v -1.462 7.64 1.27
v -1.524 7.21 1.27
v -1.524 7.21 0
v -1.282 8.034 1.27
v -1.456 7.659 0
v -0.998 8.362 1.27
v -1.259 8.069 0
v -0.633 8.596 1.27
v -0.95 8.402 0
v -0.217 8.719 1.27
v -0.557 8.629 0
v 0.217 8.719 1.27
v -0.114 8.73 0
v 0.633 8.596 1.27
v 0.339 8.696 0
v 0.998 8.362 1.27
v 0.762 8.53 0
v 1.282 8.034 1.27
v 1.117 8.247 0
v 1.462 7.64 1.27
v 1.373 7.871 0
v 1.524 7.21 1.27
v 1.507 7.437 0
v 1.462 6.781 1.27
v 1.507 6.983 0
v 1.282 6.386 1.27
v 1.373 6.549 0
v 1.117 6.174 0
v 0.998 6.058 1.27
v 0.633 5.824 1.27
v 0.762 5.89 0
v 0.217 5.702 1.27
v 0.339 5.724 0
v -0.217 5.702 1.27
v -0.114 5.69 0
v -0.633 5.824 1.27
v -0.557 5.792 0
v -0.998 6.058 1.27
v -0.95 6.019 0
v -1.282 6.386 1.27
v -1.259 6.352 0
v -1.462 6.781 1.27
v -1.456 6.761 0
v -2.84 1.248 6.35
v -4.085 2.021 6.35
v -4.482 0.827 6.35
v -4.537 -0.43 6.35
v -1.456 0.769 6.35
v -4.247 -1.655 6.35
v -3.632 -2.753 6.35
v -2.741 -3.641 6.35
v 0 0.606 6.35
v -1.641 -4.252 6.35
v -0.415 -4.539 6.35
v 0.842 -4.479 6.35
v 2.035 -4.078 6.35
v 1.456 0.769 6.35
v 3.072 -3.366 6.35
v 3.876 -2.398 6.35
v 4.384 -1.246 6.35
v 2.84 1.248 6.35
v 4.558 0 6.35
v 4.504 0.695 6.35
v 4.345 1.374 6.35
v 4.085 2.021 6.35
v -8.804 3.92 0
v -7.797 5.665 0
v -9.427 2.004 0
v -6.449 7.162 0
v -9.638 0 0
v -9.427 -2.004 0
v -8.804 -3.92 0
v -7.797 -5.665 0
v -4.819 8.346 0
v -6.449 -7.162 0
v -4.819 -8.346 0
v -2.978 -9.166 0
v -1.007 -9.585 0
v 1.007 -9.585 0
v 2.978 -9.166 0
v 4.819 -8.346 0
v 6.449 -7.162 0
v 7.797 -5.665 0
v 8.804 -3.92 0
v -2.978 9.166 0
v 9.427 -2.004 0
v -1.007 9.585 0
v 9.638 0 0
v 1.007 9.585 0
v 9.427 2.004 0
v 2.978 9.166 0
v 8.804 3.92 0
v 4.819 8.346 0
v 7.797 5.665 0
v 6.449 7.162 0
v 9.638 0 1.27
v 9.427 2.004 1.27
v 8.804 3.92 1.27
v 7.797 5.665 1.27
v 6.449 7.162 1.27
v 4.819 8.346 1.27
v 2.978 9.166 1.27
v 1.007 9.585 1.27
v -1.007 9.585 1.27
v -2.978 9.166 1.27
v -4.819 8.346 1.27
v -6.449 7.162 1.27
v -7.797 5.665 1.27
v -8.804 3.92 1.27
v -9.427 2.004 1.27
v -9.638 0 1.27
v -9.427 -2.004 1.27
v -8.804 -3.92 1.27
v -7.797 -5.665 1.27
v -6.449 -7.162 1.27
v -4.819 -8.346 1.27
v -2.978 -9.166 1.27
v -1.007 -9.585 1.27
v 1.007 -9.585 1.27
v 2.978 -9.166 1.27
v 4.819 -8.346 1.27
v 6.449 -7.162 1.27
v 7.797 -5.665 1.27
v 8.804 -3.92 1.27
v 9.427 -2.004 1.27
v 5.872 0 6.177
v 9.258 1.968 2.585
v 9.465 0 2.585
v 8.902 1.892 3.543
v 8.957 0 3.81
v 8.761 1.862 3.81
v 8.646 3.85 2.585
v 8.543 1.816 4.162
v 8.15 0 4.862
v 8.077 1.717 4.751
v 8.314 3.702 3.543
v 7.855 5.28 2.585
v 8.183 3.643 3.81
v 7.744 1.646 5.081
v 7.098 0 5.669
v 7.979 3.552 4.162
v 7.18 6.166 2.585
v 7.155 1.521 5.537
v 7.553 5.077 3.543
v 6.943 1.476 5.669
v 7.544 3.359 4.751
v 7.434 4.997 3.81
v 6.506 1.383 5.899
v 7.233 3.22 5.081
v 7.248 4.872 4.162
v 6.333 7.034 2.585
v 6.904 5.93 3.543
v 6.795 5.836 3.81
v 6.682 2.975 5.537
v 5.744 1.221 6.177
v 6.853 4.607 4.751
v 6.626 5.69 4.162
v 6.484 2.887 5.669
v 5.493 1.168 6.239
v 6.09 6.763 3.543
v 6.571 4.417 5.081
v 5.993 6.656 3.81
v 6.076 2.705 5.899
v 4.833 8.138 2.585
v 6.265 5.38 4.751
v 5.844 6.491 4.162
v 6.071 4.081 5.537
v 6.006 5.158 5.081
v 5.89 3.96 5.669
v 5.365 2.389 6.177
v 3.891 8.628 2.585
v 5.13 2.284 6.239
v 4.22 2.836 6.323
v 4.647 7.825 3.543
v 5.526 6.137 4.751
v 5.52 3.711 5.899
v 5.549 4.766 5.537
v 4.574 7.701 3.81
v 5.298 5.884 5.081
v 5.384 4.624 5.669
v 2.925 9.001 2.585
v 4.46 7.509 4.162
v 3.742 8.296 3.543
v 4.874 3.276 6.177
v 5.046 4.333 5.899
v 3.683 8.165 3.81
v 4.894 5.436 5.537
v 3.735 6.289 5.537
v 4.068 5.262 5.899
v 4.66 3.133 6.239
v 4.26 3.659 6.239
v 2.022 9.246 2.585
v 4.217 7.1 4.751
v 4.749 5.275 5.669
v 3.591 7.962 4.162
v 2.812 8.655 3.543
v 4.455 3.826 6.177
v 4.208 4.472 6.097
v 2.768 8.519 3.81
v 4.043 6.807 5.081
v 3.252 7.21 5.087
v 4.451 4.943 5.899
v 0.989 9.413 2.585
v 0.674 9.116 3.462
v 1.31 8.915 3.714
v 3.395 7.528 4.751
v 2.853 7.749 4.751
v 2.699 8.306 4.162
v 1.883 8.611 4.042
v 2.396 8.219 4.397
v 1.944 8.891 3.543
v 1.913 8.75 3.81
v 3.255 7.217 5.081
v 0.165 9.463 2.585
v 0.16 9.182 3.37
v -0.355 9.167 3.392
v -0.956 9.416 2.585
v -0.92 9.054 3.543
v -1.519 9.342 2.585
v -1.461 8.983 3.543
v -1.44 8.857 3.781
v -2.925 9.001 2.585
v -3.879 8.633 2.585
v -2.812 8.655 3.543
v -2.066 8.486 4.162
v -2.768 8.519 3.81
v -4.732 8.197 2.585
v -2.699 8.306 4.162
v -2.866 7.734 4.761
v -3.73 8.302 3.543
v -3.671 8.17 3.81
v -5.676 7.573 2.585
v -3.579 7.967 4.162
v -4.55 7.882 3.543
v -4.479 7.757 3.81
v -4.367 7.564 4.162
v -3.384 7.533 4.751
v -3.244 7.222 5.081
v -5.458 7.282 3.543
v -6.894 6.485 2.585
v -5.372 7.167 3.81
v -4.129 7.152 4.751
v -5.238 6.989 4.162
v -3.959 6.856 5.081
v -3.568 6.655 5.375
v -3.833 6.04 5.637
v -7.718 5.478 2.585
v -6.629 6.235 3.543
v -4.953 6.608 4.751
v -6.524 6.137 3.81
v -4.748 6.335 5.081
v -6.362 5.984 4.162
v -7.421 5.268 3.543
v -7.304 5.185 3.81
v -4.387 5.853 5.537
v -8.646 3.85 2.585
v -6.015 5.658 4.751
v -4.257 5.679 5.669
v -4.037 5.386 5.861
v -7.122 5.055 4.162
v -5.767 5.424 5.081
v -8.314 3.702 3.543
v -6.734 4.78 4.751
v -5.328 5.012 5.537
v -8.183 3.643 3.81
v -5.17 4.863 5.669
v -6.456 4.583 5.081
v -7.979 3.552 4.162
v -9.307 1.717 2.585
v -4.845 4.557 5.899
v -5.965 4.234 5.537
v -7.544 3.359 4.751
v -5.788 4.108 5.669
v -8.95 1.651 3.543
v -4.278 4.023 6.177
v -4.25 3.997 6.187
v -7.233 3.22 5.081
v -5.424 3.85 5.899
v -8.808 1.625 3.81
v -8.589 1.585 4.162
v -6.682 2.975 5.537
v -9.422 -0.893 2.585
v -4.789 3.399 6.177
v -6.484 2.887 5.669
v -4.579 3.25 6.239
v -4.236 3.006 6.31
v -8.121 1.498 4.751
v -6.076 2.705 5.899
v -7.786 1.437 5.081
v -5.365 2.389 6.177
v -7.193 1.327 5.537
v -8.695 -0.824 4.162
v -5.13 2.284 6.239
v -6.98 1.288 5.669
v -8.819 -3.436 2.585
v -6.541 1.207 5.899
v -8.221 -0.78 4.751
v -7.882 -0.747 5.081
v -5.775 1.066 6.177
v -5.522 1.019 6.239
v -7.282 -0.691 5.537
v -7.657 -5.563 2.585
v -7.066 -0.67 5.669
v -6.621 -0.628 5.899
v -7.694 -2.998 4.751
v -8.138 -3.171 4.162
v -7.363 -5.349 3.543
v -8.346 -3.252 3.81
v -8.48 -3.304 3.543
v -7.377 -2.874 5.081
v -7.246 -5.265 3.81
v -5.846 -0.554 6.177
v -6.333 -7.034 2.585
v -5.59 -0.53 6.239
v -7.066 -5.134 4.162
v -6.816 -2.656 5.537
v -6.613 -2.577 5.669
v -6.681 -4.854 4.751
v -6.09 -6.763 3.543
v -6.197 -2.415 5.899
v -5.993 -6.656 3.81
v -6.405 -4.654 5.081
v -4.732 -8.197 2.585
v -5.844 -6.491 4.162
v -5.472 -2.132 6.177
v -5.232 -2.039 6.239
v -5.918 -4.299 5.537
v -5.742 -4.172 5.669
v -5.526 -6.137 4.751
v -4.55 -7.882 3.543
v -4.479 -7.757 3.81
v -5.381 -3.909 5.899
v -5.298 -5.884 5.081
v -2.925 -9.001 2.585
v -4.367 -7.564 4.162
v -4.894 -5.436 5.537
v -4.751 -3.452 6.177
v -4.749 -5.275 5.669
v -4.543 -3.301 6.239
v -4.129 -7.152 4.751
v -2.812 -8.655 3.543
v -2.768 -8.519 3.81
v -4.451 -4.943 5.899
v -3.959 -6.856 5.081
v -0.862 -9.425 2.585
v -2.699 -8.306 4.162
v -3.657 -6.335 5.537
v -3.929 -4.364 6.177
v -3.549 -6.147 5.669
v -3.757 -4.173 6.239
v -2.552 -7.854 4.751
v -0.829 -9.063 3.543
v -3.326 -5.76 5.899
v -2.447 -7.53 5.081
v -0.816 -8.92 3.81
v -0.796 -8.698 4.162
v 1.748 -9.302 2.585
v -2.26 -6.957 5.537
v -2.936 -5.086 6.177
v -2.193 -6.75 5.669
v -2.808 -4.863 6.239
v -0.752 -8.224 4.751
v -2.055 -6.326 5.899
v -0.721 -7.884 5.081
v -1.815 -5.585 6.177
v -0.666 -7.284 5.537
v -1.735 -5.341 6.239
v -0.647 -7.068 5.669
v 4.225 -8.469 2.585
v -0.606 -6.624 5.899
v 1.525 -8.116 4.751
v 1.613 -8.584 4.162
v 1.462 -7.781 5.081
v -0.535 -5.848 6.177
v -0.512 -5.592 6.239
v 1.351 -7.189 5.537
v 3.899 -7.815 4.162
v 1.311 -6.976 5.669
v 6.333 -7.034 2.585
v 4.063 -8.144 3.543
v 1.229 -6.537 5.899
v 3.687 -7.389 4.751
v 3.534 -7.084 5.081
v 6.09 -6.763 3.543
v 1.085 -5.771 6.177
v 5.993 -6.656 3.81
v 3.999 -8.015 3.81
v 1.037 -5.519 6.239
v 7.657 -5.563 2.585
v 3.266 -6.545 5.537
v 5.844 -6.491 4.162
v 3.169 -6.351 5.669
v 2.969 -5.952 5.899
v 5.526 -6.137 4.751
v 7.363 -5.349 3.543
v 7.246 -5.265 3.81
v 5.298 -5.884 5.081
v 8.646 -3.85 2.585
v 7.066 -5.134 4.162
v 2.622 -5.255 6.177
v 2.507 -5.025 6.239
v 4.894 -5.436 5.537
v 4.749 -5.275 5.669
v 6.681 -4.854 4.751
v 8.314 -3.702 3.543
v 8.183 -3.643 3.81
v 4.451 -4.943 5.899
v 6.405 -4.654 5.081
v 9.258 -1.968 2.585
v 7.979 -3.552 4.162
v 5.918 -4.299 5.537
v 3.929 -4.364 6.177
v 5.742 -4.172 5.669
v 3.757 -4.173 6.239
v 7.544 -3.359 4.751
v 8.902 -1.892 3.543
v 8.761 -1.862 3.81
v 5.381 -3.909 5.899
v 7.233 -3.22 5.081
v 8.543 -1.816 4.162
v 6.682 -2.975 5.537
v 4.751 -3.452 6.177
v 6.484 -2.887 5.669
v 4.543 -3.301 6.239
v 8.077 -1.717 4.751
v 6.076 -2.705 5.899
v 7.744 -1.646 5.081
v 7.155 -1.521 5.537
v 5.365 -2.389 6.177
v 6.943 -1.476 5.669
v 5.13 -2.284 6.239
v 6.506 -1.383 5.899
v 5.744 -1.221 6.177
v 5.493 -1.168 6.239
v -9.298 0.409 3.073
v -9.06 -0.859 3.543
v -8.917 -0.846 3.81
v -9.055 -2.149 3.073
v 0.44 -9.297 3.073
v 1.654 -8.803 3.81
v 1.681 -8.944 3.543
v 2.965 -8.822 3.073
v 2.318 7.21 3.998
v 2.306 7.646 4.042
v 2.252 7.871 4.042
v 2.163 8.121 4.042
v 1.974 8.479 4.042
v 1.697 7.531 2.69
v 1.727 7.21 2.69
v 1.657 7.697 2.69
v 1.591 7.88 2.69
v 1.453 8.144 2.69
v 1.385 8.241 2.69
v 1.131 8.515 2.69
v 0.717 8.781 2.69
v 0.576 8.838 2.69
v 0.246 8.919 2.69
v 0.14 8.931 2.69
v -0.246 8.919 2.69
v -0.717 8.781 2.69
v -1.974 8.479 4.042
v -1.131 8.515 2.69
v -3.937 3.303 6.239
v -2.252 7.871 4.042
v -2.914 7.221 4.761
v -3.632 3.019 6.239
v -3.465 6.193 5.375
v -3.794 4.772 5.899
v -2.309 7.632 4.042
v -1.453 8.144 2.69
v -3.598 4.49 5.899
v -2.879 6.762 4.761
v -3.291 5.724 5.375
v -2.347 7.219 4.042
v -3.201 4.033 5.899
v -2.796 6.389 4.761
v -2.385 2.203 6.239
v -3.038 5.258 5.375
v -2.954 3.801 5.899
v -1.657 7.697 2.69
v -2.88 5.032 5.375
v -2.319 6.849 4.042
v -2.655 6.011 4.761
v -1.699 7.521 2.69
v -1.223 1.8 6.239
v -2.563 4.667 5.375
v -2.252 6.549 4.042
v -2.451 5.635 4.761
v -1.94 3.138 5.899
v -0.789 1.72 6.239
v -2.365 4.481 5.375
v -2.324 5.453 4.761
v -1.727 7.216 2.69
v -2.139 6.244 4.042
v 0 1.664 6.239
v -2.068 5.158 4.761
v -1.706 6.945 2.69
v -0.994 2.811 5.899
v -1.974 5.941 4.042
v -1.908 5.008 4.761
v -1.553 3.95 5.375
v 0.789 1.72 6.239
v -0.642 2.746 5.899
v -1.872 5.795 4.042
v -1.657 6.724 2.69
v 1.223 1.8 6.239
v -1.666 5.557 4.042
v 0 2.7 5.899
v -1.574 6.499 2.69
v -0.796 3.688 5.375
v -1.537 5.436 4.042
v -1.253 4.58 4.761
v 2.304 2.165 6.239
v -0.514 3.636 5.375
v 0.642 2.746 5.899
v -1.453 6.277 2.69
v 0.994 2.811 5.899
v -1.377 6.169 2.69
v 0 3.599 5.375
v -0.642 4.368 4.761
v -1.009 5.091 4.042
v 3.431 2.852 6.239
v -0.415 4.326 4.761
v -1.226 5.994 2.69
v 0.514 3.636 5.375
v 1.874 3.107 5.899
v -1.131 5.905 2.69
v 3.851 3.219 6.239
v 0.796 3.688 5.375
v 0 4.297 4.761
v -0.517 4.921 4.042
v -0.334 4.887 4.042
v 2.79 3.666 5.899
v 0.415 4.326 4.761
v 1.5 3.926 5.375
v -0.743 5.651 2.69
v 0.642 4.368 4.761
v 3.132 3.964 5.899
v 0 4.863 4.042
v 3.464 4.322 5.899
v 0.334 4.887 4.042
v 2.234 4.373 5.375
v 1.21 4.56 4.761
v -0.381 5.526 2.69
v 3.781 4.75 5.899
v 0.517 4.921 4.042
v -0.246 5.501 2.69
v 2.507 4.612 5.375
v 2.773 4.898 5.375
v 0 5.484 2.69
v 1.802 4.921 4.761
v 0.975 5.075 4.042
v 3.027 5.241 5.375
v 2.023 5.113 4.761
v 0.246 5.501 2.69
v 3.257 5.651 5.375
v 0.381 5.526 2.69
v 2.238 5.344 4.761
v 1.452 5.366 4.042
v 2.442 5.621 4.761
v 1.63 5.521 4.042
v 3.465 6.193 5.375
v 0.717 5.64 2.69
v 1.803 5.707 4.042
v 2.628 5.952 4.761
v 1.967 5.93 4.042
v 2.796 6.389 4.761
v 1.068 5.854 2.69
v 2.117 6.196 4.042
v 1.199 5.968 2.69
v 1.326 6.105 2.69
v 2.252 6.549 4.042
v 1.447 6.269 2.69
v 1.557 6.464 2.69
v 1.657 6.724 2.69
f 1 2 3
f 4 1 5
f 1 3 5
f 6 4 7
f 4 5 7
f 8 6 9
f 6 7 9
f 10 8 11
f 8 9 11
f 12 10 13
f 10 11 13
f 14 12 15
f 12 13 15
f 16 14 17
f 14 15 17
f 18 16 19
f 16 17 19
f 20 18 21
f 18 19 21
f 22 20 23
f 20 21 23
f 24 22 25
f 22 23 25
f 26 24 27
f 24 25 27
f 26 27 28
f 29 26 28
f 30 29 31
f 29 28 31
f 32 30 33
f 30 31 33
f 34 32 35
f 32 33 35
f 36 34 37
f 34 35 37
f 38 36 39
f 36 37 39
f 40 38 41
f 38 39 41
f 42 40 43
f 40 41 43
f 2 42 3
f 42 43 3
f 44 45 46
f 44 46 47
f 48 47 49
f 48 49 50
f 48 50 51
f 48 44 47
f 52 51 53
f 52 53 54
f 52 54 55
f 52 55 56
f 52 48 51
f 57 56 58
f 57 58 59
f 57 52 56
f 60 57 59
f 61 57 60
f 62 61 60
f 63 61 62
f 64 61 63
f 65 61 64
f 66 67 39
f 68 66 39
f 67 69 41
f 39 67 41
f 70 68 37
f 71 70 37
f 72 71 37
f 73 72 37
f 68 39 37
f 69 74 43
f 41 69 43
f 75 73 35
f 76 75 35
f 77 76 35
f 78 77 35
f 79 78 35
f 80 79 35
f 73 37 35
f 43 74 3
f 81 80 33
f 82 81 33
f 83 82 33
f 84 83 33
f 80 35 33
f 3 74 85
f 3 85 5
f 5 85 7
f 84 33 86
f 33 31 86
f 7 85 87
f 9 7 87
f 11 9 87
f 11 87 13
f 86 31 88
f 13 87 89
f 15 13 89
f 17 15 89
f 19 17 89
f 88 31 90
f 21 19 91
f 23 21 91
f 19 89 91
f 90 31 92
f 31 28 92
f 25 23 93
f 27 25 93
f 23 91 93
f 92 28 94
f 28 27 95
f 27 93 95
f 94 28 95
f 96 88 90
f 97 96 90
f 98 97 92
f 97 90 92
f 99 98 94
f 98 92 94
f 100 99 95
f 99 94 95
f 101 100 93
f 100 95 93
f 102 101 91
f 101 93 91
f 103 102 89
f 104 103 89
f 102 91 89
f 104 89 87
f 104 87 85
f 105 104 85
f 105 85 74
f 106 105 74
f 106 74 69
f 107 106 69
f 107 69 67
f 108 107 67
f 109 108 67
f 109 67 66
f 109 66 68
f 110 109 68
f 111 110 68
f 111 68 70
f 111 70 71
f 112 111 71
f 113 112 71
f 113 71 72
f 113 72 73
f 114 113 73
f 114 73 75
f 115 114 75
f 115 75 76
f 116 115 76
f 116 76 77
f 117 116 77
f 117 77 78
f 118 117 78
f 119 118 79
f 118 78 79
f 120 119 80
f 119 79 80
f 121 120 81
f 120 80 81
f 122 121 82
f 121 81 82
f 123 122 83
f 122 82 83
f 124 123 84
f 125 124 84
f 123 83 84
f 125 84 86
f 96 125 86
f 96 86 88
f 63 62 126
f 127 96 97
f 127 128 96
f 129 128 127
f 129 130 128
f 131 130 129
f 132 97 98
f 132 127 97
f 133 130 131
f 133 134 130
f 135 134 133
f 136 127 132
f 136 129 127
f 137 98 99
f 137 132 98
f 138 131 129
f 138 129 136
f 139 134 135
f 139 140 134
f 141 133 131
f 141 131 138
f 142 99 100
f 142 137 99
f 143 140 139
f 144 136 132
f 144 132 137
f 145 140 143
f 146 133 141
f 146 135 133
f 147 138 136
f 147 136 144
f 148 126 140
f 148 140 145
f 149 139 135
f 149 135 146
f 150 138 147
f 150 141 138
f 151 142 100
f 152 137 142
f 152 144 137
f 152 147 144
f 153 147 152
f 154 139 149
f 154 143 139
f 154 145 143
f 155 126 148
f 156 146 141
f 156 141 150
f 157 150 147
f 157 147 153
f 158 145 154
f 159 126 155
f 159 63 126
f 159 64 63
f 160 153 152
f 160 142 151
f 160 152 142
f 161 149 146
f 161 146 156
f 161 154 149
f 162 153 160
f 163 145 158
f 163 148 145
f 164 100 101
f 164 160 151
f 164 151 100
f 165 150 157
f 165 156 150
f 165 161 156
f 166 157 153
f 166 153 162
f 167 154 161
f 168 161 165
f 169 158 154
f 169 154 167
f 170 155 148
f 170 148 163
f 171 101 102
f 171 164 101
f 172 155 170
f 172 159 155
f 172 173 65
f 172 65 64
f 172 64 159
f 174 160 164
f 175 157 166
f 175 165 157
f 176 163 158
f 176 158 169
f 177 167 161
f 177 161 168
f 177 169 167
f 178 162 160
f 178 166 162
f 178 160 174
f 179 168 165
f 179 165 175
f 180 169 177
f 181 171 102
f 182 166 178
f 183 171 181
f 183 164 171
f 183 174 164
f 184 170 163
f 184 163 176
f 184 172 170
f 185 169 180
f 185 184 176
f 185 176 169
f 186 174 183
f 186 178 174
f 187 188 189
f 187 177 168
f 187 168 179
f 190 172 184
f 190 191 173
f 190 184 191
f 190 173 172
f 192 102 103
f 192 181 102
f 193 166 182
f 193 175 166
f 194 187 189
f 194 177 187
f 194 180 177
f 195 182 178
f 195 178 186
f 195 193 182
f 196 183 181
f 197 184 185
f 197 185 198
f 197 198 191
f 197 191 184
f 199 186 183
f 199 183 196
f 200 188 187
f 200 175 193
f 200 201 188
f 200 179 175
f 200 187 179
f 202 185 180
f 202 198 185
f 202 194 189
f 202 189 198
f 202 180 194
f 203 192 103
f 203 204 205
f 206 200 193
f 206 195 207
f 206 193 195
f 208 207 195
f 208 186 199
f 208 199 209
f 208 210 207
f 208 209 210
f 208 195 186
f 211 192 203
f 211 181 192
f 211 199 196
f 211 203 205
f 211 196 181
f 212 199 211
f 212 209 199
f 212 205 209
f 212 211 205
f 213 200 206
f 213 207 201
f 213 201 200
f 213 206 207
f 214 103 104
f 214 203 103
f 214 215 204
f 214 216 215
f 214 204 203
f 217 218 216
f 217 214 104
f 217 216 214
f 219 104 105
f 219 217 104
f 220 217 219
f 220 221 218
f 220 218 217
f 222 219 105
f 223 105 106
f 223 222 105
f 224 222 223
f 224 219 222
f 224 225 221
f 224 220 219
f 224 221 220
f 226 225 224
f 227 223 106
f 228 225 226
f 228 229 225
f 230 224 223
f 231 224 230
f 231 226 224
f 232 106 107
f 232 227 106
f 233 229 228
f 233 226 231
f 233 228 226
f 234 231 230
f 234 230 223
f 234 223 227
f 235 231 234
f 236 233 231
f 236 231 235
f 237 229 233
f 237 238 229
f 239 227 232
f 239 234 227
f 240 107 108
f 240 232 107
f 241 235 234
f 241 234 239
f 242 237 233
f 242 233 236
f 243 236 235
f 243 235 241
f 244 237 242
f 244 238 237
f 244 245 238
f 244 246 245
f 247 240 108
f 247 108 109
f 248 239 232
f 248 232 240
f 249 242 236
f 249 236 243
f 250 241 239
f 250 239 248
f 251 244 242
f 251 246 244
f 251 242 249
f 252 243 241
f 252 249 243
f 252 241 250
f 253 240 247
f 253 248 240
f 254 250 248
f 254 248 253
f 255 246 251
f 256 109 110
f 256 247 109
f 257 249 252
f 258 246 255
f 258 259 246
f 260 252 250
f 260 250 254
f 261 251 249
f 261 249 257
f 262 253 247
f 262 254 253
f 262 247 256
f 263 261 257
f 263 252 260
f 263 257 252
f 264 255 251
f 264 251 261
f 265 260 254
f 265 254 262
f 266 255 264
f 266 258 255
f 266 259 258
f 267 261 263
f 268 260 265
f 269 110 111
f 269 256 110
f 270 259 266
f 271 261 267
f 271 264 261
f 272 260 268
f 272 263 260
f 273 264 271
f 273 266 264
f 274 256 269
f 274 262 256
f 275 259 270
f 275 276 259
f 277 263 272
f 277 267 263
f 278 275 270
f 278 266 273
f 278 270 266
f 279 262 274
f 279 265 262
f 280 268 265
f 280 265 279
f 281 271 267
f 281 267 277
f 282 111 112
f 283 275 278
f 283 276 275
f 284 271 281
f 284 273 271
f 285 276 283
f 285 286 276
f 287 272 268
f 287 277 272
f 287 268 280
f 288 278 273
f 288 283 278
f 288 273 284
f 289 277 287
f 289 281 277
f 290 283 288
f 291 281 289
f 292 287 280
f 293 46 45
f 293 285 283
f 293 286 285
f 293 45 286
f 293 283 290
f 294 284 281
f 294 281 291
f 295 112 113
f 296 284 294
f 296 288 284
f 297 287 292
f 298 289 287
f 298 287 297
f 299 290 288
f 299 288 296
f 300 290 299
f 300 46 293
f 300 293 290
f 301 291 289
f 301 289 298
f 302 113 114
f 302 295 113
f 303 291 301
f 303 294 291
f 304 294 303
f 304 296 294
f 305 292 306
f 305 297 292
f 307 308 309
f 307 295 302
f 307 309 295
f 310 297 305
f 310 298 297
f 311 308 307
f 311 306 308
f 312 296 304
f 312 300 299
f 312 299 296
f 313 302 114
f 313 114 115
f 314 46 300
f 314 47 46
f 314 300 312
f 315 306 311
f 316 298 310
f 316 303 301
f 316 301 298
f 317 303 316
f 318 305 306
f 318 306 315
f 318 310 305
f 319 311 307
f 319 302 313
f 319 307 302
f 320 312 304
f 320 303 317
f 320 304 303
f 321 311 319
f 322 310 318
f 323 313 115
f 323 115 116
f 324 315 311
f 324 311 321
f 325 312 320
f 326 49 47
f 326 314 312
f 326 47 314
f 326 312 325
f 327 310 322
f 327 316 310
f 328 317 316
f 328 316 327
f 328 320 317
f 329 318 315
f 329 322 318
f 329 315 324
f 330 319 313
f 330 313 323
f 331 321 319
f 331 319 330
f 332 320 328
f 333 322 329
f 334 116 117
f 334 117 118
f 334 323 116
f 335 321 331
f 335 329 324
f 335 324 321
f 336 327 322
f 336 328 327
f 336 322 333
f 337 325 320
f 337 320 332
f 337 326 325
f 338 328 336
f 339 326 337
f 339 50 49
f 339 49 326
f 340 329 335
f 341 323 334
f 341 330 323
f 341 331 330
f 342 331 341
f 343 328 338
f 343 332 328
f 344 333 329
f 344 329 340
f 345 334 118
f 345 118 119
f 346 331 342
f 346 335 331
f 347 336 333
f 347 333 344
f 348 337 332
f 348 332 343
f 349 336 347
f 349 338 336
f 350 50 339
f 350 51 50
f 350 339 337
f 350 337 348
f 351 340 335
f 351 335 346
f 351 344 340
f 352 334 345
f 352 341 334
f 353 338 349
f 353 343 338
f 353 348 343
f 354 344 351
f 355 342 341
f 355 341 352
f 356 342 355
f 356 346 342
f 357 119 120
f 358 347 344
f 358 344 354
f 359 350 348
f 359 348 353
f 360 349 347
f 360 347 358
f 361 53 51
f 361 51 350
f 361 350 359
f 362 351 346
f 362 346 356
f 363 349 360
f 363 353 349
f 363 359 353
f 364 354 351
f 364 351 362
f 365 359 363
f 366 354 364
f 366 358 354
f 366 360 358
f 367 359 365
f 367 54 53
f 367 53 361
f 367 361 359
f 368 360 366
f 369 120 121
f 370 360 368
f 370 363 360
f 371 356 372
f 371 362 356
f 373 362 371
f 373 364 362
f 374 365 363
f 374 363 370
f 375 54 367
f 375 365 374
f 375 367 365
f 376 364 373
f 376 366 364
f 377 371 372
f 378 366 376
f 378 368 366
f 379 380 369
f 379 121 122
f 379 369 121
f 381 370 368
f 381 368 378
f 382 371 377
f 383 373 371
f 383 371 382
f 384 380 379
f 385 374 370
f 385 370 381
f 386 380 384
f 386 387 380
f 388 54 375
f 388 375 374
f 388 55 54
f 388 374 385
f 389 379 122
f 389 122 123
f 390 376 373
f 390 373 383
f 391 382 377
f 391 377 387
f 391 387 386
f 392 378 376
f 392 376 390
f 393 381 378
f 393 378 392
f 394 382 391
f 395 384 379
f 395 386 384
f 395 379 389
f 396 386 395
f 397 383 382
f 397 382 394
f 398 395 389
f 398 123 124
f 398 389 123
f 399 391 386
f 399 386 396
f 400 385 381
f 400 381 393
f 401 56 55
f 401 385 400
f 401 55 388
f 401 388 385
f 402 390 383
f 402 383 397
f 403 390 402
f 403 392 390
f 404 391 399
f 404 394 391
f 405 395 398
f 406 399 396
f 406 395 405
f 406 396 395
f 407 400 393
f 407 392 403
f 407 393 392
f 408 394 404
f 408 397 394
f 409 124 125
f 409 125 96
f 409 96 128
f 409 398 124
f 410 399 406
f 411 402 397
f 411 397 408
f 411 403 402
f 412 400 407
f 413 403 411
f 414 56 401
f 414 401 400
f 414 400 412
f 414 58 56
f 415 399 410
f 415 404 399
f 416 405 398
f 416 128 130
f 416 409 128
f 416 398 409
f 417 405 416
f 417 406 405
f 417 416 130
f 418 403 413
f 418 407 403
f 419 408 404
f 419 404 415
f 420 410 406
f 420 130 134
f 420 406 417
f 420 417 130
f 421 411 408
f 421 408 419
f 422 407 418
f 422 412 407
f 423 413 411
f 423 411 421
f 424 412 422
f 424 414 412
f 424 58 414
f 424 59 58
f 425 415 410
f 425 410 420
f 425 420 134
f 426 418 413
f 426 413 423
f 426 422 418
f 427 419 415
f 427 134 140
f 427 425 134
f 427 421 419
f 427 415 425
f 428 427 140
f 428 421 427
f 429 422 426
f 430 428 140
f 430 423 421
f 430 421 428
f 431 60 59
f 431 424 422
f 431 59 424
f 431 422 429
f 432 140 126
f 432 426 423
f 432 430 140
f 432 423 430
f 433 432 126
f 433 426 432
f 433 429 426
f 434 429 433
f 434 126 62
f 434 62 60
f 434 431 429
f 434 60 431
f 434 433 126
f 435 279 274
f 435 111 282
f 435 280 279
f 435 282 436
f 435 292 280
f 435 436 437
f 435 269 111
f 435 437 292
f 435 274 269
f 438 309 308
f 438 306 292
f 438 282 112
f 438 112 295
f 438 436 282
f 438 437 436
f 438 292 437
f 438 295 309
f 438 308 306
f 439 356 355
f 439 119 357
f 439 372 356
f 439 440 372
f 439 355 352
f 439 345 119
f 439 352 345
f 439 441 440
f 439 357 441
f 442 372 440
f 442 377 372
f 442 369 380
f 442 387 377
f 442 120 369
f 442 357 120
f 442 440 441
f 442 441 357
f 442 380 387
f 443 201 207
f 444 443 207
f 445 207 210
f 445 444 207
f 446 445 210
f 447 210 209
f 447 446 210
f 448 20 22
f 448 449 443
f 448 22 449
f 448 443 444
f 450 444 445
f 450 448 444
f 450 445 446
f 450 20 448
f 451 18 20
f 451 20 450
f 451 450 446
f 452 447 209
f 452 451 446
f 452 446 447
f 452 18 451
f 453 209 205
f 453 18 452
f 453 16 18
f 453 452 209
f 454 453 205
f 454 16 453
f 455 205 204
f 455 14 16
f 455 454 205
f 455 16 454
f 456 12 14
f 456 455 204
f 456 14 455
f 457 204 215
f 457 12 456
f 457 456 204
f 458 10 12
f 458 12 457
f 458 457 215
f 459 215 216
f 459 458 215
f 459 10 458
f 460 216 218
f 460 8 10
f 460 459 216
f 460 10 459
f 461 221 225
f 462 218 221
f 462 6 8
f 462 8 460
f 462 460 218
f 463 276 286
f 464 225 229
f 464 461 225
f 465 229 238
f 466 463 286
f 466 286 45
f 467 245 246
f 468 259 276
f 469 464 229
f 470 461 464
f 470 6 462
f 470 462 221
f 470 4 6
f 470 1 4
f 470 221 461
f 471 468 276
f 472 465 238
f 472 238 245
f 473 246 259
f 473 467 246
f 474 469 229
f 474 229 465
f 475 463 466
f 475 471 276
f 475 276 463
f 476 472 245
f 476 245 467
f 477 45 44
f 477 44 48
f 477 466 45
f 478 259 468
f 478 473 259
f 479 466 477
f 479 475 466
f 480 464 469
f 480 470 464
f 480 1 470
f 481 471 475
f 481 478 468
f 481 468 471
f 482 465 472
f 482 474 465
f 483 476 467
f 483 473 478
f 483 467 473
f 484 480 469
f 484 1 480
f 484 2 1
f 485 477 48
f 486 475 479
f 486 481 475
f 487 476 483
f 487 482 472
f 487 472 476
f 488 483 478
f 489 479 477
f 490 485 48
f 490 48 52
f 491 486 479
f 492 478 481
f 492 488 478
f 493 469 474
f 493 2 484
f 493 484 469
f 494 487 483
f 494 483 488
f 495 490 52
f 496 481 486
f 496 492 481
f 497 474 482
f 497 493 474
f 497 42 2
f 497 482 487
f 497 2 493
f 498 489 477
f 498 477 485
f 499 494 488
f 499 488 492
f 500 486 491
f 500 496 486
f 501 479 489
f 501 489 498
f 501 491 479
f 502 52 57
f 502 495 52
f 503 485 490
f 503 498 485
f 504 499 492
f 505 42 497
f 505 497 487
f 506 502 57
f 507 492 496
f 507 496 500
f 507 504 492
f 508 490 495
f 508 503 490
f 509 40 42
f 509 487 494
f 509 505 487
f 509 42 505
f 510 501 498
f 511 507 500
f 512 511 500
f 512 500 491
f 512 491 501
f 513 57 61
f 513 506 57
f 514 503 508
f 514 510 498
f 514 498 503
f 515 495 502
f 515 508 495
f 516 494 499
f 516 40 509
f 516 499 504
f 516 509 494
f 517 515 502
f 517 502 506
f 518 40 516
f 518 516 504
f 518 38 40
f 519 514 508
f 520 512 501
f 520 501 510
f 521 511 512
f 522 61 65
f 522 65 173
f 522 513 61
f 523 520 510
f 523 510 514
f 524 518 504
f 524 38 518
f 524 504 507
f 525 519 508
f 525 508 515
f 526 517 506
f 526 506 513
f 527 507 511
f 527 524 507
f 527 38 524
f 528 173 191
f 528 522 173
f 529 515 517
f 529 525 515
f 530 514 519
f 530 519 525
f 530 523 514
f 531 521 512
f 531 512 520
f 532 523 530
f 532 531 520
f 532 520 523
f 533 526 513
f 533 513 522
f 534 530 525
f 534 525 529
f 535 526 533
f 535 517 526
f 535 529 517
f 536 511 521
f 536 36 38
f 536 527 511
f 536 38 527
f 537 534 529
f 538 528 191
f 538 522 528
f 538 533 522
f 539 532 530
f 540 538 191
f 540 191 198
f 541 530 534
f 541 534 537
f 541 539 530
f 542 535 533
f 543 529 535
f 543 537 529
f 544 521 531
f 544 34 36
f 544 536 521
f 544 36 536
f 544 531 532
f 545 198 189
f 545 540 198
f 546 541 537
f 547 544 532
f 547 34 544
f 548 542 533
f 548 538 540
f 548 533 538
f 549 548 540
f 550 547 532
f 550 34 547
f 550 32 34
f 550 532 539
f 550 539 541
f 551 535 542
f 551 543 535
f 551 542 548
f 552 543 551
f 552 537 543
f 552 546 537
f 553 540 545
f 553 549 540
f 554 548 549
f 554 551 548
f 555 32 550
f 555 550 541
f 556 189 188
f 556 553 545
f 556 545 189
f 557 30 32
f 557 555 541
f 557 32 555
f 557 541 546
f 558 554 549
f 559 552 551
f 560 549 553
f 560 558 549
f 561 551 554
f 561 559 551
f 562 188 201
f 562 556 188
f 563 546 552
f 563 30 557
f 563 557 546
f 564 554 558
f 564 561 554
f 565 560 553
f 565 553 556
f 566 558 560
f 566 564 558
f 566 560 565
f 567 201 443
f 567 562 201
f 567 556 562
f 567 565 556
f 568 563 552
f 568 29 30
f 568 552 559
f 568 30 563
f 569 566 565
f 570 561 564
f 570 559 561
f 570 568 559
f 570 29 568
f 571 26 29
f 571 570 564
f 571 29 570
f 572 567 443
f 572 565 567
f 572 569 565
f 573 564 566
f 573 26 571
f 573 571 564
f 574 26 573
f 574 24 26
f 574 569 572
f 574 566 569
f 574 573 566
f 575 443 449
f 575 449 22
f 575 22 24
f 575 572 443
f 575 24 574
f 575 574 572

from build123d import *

# Parameters (mm, degrees)
F0_R     = 9.6376461191
F1_DEPTH = 6.35
F3_D     = 3.048


# Not quite as in the source:
# - a fillet or chamfer that OpenCascade refuses, or shapes differently, is made with other operations: its cross-section is extruded or revolved along the edge and cut away or added
# - a length typed as a fraction of an inch, garbled in the dataset ("3 / 203.2 mm" for 3/8 in), is restored


with BuildPart() as f1:
    # F0 (on Top) → F1 (new body)
    with BuildSketch(Plane.XY):
        Circle(F0_R)
    extrude(amount=F1_DEPTH)

    # F3 (through all)
    with Locations(Plane.XY.offset(6.35)):
        with Locations((0, 7.2102034464)):
            Hole(F3_D / 2)

    # F4: fillet of radius 5.08 on 2 edges, made by hand

    # F4_s1 → F4_t2 (revolve, cut)
    with BuildSketch(Plane.XZ):
        with BuildLine():
            ThreePointArc((9.6376461191, 1.27), (8.1497485675, 4.8621024484), (4.5576461191, 6.35))
            Line((4.5576461191, 6.35), (9.6376461191, 6.35))
            Line((9.6376461191, 6.35), (9.6376461191, 1.27))
        make_face()
    revolve(axis=Axis((0, 0, 6.35), (0, 0, 1)), mode=Mode.SUBTRACT)

    # F4_s3 → F4_t4 (revolve, cut)
    with BuildSketch(Plane.XZ.offset(-7.2102034464)):
        with BuildLine():
            ThreePointArc((6.604, 6.35), (3.0118975516, 4.8621024484), (1.524, 1.27))
            Line((1.524, 1.27), (1.524, 6.35))
            Line((1.524, 6.35), (6.604, 6.35))
        make_face()
    revolve(axis=Axis((0, 7.2102034464, 6.35), (0, 0, 1)), mode=Mode.SUBTRACT)


solid = f1.part
